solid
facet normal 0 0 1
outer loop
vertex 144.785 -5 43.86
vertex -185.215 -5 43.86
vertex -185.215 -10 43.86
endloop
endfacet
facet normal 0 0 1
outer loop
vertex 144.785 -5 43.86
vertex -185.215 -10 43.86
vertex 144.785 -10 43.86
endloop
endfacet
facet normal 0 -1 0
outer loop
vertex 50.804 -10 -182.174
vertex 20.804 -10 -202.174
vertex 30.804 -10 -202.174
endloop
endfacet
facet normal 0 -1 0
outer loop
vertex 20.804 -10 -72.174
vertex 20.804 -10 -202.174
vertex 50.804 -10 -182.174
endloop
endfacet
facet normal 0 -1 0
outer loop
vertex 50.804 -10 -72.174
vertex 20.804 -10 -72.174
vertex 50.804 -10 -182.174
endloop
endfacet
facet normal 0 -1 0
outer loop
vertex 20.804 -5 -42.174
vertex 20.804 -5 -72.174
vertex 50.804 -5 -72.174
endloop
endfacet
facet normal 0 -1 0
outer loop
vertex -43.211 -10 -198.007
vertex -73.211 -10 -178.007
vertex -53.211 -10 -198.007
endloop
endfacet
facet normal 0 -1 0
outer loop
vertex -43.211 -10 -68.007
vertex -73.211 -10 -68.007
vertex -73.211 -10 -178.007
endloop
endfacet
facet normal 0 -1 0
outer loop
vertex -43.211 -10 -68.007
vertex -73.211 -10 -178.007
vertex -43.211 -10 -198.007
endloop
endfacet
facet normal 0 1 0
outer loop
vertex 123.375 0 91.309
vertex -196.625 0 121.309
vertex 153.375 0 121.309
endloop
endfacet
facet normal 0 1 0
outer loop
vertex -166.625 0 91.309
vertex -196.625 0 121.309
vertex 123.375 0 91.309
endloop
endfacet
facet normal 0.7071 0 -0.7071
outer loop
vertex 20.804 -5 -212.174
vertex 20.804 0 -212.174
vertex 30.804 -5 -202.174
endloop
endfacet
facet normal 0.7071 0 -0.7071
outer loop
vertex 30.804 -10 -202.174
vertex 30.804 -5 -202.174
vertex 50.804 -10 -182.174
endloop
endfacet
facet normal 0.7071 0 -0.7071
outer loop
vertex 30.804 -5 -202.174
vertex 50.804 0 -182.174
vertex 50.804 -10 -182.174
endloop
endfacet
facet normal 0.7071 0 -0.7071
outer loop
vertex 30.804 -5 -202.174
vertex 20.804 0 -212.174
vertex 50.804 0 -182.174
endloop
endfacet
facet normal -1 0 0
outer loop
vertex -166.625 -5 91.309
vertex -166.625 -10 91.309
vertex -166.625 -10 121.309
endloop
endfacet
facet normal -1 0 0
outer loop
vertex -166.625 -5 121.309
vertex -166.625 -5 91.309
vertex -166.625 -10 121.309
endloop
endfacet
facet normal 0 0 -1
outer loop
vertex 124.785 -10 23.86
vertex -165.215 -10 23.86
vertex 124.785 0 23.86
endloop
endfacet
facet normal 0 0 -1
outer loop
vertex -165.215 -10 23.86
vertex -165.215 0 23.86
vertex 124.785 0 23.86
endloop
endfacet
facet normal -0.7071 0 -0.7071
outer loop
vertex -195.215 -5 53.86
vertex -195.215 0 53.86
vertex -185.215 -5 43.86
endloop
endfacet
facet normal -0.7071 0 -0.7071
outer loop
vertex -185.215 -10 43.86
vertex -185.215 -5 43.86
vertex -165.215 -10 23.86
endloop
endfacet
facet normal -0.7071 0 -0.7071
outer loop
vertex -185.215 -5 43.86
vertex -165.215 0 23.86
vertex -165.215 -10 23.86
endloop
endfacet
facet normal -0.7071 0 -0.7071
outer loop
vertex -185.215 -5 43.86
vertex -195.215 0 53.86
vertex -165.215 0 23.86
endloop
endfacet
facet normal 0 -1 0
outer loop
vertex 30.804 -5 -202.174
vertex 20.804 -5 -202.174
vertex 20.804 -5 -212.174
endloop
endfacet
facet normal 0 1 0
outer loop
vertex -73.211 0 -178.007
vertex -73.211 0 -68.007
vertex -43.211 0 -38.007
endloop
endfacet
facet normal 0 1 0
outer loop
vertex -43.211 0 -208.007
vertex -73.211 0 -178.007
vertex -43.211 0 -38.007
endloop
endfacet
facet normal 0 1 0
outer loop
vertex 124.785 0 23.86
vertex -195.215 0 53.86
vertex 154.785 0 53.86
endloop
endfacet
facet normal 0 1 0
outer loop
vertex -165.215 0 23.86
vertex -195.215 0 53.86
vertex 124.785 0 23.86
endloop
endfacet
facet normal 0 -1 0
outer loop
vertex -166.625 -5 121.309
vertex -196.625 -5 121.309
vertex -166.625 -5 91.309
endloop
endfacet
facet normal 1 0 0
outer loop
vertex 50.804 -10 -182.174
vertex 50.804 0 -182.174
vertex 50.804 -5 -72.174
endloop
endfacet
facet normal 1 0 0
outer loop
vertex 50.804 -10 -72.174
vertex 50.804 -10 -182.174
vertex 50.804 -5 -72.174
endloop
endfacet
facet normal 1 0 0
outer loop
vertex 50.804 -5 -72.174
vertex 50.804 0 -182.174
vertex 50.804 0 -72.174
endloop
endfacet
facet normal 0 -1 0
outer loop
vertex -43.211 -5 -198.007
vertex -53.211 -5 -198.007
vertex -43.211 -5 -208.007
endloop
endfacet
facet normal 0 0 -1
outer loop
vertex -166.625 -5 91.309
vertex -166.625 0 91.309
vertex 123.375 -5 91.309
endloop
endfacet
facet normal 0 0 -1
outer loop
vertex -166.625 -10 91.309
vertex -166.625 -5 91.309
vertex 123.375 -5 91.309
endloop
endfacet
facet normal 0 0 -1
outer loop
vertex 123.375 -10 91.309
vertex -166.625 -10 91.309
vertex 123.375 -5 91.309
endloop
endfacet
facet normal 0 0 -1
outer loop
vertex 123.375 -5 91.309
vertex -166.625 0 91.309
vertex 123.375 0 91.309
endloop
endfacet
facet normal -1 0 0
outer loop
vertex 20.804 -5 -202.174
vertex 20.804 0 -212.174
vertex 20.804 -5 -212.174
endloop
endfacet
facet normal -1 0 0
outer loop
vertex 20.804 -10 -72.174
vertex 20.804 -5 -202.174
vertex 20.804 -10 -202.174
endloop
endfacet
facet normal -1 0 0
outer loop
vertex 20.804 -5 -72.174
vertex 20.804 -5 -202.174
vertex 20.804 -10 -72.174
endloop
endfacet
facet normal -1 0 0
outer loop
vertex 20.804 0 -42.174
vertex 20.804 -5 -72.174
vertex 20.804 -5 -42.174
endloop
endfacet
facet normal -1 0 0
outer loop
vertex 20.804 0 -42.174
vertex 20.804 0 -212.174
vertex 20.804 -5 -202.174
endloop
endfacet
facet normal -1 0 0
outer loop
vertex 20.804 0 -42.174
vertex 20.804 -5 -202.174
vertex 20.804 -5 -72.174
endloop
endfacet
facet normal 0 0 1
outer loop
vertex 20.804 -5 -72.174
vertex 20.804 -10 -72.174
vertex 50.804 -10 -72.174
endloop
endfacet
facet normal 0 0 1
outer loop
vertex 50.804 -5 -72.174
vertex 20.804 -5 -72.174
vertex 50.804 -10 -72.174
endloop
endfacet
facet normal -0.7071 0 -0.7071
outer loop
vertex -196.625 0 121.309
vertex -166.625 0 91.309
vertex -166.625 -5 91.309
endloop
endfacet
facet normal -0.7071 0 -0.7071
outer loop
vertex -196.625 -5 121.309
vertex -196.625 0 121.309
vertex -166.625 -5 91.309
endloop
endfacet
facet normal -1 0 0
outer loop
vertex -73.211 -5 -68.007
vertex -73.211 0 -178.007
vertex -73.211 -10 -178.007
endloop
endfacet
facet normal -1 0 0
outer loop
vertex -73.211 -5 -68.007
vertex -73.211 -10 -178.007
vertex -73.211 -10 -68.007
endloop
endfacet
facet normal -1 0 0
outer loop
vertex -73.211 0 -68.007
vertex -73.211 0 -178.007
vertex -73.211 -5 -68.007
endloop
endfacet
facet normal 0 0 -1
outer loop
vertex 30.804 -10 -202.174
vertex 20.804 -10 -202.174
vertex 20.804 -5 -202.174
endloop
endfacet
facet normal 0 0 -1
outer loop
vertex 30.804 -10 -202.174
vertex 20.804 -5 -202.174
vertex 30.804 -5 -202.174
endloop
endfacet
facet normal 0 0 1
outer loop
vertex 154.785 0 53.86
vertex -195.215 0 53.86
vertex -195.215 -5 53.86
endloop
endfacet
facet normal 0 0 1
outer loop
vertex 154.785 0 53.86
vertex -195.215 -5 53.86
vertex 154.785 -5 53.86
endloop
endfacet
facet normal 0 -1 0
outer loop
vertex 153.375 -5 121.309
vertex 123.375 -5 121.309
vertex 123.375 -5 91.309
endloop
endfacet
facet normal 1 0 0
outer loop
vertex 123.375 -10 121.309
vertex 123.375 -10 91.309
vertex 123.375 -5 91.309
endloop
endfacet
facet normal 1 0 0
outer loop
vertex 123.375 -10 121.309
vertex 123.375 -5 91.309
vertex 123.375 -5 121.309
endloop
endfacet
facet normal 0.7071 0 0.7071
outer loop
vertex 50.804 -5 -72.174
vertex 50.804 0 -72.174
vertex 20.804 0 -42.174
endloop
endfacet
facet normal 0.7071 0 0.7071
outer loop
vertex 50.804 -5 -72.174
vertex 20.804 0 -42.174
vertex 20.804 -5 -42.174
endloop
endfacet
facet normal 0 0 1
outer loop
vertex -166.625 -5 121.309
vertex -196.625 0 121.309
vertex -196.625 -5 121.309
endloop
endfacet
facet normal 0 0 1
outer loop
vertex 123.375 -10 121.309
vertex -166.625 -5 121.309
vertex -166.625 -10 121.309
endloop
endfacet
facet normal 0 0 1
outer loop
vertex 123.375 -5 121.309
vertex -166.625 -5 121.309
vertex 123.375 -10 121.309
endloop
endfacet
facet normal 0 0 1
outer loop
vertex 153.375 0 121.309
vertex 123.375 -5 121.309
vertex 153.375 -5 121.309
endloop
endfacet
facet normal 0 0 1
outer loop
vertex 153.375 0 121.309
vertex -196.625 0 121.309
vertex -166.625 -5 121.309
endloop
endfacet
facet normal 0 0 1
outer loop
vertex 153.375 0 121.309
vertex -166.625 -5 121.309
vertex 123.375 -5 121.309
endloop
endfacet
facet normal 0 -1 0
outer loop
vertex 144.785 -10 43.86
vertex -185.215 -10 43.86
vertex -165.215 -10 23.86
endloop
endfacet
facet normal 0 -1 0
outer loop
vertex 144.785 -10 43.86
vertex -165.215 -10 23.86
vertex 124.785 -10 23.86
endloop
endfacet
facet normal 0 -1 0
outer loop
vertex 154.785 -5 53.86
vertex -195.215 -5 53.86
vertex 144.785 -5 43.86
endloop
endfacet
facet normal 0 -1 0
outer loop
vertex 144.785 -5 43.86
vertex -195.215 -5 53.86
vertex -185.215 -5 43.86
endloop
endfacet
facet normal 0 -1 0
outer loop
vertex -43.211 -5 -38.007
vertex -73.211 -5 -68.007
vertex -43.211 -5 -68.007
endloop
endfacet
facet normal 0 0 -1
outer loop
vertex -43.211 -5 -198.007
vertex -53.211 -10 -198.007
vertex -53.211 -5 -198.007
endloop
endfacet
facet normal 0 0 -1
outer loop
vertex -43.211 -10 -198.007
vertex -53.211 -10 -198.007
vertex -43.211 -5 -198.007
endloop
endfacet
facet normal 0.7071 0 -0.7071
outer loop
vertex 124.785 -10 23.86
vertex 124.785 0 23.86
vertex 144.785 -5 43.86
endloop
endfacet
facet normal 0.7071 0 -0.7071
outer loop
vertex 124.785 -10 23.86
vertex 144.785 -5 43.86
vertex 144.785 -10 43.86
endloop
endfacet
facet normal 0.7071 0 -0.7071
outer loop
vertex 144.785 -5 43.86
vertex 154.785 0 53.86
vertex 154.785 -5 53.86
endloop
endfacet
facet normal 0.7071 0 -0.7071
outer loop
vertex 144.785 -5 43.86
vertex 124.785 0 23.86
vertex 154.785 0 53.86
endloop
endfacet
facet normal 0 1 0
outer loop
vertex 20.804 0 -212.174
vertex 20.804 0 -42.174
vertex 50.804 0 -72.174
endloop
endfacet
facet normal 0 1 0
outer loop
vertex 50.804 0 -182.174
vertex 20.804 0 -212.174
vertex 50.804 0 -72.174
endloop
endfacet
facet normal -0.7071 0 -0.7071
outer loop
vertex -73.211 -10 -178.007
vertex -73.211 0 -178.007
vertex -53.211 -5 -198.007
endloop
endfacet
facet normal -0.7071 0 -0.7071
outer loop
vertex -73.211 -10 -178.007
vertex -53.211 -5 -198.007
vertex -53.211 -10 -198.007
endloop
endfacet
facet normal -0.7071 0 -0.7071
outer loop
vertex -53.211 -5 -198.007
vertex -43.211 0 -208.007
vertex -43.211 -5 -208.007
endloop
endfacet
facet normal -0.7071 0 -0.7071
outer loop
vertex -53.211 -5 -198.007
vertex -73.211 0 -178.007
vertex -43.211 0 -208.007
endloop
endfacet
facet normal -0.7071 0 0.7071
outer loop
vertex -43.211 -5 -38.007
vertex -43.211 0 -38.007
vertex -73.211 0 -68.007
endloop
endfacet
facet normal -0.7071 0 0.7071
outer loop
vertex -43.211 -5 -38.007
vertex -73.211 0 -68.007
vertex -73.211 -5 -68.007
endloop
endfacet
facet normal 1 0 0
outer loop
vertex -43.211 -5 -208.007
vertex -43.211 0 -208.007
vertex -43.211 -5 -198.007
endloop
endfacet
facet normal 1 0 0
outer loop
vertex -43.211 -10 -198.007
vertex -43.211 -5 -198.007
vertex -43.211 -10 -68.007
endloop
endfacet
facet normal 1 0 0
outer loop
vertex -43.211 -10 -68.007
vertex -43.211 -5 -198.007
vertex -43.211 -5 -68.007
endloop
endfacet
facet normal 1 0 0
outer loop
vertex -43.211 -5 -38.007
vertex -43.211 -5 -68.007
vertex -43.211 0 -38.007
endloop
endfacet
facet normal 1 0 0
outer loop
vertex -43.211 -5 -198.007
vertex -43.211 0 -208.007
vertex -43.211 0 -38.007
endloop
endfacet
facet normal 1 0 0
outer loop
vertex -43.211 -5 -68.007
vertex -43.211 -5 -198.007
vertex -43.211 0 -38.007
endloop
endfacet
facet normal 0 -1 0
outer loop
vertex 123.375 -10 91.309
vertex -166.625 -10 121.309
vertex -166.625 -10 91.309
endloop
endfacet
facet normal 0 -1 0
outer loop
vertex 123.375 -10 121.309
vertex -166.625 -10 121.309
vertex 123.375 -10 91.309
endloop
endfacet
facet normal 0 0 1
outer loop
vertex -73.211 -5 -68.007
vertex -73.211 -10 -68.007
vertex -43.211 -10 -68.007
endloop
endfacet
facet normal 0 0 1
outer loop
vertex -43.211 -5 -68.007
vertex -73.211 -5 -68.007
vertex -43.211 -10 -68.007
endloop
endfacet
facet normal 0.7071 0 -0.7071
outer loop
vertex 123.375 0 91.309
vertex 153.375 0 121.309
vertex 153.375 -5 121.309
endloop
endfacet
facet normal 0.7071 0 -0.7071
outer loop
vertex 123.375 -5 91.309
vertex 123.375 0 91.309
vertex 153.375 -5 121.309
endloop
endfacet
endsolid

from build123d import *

# Parameters (mm, degrees)
F0_W       = 350
F0_H       = 30
F1_DEPTH   = 10
F0_W_2     = 30
F0_H_2     = 170
F2_W       = 30
F2_H       = 30
F3_DEPTH   = 5
F4_W       = 30
F4_H       = 30
F4_H_2     = 10
F5_DEPTH   = 5
F6_W       = 30
F6_H       = 30
F6_H_2     = 10
F7_DEPTH   = 5
F8_W       = 350
F8_H       = 30
F9_DEPTH   = 5
F10_W      = 350
F10_H      = 20
F11_DEPTH  = 5
F12_SIZE   = 29.99999
F12_2_SIZE = 29.99999
F12_3_SIZE = 29.99999
F12_4_SIZE = 29.99999


# Not quite as in the source:
# - a fillet or chamfer is up to 0.001 mm smaller than in the source, because OpenCascade refuses the exact size


with BuildPart() as f1:
    # F0 (on Front) → F1 (new body)
    with BuildSketch(Plane.XZ):
        with Locations((-21.6247046013, 106.3088514348)):
            Rectangle(F0_W, F0_H)
    extrude(amount=F1_DEPTH)

    # F2 (on face) → F3 (cut)
    with BuildSketch(Plane.XZ.offset(10)):
        with Locations((-181.6247046013, 106.3088514348)):
            Rectangle(F2_W, F2_H)
        with Locations((138.3752953987, 106.3088514348)):
            Rectangle(F2_W, F2_H)
    extrude(amount=-F3_DEPTH, mode=Mode.SUBTRACT)

    # F12 (size 30 in the source; OpenCascade refuses exactly that, so slightly less here)
    f12_edges = [f1.edges().sort_by_distance(p)[0] for p in [
        (-196.624705, -2.5, 91.308851),
        (153.375295, -2.5, 91.308851),
    ]]
    chamfer(f12_edges, length=F12_SIZE)


with BuildPart() as f1b:
    # F0 (on Front) → F1, piece 2 (new body)
    with BuildSketch(Plane.XZ):
        with Locations((-58.2107634842, -123.0070780963)):
            Rectangle(F0_W_2, F0_H_2)
    extrude(amount=F1_DEPTH)

    # F4 (on face) → F5 (cut)
    with BuildSketch(Plane.XZ.offset(10)):
        with Locations((-58.2107634842, -53.0070780963)):
            Rectangle(F4_W, F4_H)
        with Locations((-58.2107634842, -203.0070780963)):
            Rectangle(F4_W, F4_H_2)
    extrude(amount=-F5_DEPTH, mode=Mode.SUBTRACT)

    # F12#3 (size 30 in the source; OpenCascade refuses exactly that, so slightly less here)
    f12_3_edges = [f1b.edges().sort_by_distance(p)[0] for p in [
        (-73.210763, -2.5, -38.007078),
        (-73.210763, -2.5, -208.007078),
    ]]
    chamfer(f12_3_edges, length=F12_3_SIZE)


with BuildPart() as f1c:
    # F0 (on Front) → F1, piece 3 (new body)
    with BuildSketch(Plane.XZ):
        with Locations((35.80392465, -127.1743857861)):
            Rectangle(F0_W_2, F0_H_2)
    extrude(amount=F1_DEPTH)

    # F6 (on face) → F7 (cut)
    with BuildSketch(Plane.XZ.offset(10)):
        with Locations((35.80392465, -57.1743857861)):
            Rectangle(F6_W, F6_H)
        with Locations((35.80392465, -207.1743857861)):
            Rectangle(F6_W, F6_H_2)
    extrude(amount=-F7_DEPTH, mode=Mode.SUBTRACT)

    # F12#2 (size 30 in the source; OpenCascade refuses exactly that, so slightly less here)
    f12_2_edges = [f1c.edges().sort_by_distance(p)[0] for p in [
        (50.803925, -2.5, -42.174386),
        (50.803925, -2.5, -212.174386),
    ]]
    chamfer(f12_2_edges, length=F12_2_SIZE)


with BuildPart() as f9:
    # F8 (on Front) → F9 (new body)
    with BuildSketch(Plane.XZ):
        with Locations((-20.2150419354, 38.859708766)):
            Rectangle(F8_W, F8_H)
    extrude(amount=F9_DEPTH)

    # F10 (on face) → F11 (join)
    with BuildSketch(Plane.XZ.offset(5)):
        with Locations((-20.2150419354, 33.859708766)):
            Rectangle(F10_W, F10_H)
    extrude(amount=F11_DEPTH)

    # F12#4 (size 30 in the source; OpenCascade refuses exactly that, so slightly less here)
    f12_4_edges = [f9.edges().sort_by_distance(p)[0] for p in [
        (-195.215042, -5, 23.859709),
        (154.784958, -5, 23.859709),
    ]]
    chamfer(f12_4_edges, length=F12_4_SIZE)


solid = Compound([f1.part, f1b.part, f1c.part, f9.part])
